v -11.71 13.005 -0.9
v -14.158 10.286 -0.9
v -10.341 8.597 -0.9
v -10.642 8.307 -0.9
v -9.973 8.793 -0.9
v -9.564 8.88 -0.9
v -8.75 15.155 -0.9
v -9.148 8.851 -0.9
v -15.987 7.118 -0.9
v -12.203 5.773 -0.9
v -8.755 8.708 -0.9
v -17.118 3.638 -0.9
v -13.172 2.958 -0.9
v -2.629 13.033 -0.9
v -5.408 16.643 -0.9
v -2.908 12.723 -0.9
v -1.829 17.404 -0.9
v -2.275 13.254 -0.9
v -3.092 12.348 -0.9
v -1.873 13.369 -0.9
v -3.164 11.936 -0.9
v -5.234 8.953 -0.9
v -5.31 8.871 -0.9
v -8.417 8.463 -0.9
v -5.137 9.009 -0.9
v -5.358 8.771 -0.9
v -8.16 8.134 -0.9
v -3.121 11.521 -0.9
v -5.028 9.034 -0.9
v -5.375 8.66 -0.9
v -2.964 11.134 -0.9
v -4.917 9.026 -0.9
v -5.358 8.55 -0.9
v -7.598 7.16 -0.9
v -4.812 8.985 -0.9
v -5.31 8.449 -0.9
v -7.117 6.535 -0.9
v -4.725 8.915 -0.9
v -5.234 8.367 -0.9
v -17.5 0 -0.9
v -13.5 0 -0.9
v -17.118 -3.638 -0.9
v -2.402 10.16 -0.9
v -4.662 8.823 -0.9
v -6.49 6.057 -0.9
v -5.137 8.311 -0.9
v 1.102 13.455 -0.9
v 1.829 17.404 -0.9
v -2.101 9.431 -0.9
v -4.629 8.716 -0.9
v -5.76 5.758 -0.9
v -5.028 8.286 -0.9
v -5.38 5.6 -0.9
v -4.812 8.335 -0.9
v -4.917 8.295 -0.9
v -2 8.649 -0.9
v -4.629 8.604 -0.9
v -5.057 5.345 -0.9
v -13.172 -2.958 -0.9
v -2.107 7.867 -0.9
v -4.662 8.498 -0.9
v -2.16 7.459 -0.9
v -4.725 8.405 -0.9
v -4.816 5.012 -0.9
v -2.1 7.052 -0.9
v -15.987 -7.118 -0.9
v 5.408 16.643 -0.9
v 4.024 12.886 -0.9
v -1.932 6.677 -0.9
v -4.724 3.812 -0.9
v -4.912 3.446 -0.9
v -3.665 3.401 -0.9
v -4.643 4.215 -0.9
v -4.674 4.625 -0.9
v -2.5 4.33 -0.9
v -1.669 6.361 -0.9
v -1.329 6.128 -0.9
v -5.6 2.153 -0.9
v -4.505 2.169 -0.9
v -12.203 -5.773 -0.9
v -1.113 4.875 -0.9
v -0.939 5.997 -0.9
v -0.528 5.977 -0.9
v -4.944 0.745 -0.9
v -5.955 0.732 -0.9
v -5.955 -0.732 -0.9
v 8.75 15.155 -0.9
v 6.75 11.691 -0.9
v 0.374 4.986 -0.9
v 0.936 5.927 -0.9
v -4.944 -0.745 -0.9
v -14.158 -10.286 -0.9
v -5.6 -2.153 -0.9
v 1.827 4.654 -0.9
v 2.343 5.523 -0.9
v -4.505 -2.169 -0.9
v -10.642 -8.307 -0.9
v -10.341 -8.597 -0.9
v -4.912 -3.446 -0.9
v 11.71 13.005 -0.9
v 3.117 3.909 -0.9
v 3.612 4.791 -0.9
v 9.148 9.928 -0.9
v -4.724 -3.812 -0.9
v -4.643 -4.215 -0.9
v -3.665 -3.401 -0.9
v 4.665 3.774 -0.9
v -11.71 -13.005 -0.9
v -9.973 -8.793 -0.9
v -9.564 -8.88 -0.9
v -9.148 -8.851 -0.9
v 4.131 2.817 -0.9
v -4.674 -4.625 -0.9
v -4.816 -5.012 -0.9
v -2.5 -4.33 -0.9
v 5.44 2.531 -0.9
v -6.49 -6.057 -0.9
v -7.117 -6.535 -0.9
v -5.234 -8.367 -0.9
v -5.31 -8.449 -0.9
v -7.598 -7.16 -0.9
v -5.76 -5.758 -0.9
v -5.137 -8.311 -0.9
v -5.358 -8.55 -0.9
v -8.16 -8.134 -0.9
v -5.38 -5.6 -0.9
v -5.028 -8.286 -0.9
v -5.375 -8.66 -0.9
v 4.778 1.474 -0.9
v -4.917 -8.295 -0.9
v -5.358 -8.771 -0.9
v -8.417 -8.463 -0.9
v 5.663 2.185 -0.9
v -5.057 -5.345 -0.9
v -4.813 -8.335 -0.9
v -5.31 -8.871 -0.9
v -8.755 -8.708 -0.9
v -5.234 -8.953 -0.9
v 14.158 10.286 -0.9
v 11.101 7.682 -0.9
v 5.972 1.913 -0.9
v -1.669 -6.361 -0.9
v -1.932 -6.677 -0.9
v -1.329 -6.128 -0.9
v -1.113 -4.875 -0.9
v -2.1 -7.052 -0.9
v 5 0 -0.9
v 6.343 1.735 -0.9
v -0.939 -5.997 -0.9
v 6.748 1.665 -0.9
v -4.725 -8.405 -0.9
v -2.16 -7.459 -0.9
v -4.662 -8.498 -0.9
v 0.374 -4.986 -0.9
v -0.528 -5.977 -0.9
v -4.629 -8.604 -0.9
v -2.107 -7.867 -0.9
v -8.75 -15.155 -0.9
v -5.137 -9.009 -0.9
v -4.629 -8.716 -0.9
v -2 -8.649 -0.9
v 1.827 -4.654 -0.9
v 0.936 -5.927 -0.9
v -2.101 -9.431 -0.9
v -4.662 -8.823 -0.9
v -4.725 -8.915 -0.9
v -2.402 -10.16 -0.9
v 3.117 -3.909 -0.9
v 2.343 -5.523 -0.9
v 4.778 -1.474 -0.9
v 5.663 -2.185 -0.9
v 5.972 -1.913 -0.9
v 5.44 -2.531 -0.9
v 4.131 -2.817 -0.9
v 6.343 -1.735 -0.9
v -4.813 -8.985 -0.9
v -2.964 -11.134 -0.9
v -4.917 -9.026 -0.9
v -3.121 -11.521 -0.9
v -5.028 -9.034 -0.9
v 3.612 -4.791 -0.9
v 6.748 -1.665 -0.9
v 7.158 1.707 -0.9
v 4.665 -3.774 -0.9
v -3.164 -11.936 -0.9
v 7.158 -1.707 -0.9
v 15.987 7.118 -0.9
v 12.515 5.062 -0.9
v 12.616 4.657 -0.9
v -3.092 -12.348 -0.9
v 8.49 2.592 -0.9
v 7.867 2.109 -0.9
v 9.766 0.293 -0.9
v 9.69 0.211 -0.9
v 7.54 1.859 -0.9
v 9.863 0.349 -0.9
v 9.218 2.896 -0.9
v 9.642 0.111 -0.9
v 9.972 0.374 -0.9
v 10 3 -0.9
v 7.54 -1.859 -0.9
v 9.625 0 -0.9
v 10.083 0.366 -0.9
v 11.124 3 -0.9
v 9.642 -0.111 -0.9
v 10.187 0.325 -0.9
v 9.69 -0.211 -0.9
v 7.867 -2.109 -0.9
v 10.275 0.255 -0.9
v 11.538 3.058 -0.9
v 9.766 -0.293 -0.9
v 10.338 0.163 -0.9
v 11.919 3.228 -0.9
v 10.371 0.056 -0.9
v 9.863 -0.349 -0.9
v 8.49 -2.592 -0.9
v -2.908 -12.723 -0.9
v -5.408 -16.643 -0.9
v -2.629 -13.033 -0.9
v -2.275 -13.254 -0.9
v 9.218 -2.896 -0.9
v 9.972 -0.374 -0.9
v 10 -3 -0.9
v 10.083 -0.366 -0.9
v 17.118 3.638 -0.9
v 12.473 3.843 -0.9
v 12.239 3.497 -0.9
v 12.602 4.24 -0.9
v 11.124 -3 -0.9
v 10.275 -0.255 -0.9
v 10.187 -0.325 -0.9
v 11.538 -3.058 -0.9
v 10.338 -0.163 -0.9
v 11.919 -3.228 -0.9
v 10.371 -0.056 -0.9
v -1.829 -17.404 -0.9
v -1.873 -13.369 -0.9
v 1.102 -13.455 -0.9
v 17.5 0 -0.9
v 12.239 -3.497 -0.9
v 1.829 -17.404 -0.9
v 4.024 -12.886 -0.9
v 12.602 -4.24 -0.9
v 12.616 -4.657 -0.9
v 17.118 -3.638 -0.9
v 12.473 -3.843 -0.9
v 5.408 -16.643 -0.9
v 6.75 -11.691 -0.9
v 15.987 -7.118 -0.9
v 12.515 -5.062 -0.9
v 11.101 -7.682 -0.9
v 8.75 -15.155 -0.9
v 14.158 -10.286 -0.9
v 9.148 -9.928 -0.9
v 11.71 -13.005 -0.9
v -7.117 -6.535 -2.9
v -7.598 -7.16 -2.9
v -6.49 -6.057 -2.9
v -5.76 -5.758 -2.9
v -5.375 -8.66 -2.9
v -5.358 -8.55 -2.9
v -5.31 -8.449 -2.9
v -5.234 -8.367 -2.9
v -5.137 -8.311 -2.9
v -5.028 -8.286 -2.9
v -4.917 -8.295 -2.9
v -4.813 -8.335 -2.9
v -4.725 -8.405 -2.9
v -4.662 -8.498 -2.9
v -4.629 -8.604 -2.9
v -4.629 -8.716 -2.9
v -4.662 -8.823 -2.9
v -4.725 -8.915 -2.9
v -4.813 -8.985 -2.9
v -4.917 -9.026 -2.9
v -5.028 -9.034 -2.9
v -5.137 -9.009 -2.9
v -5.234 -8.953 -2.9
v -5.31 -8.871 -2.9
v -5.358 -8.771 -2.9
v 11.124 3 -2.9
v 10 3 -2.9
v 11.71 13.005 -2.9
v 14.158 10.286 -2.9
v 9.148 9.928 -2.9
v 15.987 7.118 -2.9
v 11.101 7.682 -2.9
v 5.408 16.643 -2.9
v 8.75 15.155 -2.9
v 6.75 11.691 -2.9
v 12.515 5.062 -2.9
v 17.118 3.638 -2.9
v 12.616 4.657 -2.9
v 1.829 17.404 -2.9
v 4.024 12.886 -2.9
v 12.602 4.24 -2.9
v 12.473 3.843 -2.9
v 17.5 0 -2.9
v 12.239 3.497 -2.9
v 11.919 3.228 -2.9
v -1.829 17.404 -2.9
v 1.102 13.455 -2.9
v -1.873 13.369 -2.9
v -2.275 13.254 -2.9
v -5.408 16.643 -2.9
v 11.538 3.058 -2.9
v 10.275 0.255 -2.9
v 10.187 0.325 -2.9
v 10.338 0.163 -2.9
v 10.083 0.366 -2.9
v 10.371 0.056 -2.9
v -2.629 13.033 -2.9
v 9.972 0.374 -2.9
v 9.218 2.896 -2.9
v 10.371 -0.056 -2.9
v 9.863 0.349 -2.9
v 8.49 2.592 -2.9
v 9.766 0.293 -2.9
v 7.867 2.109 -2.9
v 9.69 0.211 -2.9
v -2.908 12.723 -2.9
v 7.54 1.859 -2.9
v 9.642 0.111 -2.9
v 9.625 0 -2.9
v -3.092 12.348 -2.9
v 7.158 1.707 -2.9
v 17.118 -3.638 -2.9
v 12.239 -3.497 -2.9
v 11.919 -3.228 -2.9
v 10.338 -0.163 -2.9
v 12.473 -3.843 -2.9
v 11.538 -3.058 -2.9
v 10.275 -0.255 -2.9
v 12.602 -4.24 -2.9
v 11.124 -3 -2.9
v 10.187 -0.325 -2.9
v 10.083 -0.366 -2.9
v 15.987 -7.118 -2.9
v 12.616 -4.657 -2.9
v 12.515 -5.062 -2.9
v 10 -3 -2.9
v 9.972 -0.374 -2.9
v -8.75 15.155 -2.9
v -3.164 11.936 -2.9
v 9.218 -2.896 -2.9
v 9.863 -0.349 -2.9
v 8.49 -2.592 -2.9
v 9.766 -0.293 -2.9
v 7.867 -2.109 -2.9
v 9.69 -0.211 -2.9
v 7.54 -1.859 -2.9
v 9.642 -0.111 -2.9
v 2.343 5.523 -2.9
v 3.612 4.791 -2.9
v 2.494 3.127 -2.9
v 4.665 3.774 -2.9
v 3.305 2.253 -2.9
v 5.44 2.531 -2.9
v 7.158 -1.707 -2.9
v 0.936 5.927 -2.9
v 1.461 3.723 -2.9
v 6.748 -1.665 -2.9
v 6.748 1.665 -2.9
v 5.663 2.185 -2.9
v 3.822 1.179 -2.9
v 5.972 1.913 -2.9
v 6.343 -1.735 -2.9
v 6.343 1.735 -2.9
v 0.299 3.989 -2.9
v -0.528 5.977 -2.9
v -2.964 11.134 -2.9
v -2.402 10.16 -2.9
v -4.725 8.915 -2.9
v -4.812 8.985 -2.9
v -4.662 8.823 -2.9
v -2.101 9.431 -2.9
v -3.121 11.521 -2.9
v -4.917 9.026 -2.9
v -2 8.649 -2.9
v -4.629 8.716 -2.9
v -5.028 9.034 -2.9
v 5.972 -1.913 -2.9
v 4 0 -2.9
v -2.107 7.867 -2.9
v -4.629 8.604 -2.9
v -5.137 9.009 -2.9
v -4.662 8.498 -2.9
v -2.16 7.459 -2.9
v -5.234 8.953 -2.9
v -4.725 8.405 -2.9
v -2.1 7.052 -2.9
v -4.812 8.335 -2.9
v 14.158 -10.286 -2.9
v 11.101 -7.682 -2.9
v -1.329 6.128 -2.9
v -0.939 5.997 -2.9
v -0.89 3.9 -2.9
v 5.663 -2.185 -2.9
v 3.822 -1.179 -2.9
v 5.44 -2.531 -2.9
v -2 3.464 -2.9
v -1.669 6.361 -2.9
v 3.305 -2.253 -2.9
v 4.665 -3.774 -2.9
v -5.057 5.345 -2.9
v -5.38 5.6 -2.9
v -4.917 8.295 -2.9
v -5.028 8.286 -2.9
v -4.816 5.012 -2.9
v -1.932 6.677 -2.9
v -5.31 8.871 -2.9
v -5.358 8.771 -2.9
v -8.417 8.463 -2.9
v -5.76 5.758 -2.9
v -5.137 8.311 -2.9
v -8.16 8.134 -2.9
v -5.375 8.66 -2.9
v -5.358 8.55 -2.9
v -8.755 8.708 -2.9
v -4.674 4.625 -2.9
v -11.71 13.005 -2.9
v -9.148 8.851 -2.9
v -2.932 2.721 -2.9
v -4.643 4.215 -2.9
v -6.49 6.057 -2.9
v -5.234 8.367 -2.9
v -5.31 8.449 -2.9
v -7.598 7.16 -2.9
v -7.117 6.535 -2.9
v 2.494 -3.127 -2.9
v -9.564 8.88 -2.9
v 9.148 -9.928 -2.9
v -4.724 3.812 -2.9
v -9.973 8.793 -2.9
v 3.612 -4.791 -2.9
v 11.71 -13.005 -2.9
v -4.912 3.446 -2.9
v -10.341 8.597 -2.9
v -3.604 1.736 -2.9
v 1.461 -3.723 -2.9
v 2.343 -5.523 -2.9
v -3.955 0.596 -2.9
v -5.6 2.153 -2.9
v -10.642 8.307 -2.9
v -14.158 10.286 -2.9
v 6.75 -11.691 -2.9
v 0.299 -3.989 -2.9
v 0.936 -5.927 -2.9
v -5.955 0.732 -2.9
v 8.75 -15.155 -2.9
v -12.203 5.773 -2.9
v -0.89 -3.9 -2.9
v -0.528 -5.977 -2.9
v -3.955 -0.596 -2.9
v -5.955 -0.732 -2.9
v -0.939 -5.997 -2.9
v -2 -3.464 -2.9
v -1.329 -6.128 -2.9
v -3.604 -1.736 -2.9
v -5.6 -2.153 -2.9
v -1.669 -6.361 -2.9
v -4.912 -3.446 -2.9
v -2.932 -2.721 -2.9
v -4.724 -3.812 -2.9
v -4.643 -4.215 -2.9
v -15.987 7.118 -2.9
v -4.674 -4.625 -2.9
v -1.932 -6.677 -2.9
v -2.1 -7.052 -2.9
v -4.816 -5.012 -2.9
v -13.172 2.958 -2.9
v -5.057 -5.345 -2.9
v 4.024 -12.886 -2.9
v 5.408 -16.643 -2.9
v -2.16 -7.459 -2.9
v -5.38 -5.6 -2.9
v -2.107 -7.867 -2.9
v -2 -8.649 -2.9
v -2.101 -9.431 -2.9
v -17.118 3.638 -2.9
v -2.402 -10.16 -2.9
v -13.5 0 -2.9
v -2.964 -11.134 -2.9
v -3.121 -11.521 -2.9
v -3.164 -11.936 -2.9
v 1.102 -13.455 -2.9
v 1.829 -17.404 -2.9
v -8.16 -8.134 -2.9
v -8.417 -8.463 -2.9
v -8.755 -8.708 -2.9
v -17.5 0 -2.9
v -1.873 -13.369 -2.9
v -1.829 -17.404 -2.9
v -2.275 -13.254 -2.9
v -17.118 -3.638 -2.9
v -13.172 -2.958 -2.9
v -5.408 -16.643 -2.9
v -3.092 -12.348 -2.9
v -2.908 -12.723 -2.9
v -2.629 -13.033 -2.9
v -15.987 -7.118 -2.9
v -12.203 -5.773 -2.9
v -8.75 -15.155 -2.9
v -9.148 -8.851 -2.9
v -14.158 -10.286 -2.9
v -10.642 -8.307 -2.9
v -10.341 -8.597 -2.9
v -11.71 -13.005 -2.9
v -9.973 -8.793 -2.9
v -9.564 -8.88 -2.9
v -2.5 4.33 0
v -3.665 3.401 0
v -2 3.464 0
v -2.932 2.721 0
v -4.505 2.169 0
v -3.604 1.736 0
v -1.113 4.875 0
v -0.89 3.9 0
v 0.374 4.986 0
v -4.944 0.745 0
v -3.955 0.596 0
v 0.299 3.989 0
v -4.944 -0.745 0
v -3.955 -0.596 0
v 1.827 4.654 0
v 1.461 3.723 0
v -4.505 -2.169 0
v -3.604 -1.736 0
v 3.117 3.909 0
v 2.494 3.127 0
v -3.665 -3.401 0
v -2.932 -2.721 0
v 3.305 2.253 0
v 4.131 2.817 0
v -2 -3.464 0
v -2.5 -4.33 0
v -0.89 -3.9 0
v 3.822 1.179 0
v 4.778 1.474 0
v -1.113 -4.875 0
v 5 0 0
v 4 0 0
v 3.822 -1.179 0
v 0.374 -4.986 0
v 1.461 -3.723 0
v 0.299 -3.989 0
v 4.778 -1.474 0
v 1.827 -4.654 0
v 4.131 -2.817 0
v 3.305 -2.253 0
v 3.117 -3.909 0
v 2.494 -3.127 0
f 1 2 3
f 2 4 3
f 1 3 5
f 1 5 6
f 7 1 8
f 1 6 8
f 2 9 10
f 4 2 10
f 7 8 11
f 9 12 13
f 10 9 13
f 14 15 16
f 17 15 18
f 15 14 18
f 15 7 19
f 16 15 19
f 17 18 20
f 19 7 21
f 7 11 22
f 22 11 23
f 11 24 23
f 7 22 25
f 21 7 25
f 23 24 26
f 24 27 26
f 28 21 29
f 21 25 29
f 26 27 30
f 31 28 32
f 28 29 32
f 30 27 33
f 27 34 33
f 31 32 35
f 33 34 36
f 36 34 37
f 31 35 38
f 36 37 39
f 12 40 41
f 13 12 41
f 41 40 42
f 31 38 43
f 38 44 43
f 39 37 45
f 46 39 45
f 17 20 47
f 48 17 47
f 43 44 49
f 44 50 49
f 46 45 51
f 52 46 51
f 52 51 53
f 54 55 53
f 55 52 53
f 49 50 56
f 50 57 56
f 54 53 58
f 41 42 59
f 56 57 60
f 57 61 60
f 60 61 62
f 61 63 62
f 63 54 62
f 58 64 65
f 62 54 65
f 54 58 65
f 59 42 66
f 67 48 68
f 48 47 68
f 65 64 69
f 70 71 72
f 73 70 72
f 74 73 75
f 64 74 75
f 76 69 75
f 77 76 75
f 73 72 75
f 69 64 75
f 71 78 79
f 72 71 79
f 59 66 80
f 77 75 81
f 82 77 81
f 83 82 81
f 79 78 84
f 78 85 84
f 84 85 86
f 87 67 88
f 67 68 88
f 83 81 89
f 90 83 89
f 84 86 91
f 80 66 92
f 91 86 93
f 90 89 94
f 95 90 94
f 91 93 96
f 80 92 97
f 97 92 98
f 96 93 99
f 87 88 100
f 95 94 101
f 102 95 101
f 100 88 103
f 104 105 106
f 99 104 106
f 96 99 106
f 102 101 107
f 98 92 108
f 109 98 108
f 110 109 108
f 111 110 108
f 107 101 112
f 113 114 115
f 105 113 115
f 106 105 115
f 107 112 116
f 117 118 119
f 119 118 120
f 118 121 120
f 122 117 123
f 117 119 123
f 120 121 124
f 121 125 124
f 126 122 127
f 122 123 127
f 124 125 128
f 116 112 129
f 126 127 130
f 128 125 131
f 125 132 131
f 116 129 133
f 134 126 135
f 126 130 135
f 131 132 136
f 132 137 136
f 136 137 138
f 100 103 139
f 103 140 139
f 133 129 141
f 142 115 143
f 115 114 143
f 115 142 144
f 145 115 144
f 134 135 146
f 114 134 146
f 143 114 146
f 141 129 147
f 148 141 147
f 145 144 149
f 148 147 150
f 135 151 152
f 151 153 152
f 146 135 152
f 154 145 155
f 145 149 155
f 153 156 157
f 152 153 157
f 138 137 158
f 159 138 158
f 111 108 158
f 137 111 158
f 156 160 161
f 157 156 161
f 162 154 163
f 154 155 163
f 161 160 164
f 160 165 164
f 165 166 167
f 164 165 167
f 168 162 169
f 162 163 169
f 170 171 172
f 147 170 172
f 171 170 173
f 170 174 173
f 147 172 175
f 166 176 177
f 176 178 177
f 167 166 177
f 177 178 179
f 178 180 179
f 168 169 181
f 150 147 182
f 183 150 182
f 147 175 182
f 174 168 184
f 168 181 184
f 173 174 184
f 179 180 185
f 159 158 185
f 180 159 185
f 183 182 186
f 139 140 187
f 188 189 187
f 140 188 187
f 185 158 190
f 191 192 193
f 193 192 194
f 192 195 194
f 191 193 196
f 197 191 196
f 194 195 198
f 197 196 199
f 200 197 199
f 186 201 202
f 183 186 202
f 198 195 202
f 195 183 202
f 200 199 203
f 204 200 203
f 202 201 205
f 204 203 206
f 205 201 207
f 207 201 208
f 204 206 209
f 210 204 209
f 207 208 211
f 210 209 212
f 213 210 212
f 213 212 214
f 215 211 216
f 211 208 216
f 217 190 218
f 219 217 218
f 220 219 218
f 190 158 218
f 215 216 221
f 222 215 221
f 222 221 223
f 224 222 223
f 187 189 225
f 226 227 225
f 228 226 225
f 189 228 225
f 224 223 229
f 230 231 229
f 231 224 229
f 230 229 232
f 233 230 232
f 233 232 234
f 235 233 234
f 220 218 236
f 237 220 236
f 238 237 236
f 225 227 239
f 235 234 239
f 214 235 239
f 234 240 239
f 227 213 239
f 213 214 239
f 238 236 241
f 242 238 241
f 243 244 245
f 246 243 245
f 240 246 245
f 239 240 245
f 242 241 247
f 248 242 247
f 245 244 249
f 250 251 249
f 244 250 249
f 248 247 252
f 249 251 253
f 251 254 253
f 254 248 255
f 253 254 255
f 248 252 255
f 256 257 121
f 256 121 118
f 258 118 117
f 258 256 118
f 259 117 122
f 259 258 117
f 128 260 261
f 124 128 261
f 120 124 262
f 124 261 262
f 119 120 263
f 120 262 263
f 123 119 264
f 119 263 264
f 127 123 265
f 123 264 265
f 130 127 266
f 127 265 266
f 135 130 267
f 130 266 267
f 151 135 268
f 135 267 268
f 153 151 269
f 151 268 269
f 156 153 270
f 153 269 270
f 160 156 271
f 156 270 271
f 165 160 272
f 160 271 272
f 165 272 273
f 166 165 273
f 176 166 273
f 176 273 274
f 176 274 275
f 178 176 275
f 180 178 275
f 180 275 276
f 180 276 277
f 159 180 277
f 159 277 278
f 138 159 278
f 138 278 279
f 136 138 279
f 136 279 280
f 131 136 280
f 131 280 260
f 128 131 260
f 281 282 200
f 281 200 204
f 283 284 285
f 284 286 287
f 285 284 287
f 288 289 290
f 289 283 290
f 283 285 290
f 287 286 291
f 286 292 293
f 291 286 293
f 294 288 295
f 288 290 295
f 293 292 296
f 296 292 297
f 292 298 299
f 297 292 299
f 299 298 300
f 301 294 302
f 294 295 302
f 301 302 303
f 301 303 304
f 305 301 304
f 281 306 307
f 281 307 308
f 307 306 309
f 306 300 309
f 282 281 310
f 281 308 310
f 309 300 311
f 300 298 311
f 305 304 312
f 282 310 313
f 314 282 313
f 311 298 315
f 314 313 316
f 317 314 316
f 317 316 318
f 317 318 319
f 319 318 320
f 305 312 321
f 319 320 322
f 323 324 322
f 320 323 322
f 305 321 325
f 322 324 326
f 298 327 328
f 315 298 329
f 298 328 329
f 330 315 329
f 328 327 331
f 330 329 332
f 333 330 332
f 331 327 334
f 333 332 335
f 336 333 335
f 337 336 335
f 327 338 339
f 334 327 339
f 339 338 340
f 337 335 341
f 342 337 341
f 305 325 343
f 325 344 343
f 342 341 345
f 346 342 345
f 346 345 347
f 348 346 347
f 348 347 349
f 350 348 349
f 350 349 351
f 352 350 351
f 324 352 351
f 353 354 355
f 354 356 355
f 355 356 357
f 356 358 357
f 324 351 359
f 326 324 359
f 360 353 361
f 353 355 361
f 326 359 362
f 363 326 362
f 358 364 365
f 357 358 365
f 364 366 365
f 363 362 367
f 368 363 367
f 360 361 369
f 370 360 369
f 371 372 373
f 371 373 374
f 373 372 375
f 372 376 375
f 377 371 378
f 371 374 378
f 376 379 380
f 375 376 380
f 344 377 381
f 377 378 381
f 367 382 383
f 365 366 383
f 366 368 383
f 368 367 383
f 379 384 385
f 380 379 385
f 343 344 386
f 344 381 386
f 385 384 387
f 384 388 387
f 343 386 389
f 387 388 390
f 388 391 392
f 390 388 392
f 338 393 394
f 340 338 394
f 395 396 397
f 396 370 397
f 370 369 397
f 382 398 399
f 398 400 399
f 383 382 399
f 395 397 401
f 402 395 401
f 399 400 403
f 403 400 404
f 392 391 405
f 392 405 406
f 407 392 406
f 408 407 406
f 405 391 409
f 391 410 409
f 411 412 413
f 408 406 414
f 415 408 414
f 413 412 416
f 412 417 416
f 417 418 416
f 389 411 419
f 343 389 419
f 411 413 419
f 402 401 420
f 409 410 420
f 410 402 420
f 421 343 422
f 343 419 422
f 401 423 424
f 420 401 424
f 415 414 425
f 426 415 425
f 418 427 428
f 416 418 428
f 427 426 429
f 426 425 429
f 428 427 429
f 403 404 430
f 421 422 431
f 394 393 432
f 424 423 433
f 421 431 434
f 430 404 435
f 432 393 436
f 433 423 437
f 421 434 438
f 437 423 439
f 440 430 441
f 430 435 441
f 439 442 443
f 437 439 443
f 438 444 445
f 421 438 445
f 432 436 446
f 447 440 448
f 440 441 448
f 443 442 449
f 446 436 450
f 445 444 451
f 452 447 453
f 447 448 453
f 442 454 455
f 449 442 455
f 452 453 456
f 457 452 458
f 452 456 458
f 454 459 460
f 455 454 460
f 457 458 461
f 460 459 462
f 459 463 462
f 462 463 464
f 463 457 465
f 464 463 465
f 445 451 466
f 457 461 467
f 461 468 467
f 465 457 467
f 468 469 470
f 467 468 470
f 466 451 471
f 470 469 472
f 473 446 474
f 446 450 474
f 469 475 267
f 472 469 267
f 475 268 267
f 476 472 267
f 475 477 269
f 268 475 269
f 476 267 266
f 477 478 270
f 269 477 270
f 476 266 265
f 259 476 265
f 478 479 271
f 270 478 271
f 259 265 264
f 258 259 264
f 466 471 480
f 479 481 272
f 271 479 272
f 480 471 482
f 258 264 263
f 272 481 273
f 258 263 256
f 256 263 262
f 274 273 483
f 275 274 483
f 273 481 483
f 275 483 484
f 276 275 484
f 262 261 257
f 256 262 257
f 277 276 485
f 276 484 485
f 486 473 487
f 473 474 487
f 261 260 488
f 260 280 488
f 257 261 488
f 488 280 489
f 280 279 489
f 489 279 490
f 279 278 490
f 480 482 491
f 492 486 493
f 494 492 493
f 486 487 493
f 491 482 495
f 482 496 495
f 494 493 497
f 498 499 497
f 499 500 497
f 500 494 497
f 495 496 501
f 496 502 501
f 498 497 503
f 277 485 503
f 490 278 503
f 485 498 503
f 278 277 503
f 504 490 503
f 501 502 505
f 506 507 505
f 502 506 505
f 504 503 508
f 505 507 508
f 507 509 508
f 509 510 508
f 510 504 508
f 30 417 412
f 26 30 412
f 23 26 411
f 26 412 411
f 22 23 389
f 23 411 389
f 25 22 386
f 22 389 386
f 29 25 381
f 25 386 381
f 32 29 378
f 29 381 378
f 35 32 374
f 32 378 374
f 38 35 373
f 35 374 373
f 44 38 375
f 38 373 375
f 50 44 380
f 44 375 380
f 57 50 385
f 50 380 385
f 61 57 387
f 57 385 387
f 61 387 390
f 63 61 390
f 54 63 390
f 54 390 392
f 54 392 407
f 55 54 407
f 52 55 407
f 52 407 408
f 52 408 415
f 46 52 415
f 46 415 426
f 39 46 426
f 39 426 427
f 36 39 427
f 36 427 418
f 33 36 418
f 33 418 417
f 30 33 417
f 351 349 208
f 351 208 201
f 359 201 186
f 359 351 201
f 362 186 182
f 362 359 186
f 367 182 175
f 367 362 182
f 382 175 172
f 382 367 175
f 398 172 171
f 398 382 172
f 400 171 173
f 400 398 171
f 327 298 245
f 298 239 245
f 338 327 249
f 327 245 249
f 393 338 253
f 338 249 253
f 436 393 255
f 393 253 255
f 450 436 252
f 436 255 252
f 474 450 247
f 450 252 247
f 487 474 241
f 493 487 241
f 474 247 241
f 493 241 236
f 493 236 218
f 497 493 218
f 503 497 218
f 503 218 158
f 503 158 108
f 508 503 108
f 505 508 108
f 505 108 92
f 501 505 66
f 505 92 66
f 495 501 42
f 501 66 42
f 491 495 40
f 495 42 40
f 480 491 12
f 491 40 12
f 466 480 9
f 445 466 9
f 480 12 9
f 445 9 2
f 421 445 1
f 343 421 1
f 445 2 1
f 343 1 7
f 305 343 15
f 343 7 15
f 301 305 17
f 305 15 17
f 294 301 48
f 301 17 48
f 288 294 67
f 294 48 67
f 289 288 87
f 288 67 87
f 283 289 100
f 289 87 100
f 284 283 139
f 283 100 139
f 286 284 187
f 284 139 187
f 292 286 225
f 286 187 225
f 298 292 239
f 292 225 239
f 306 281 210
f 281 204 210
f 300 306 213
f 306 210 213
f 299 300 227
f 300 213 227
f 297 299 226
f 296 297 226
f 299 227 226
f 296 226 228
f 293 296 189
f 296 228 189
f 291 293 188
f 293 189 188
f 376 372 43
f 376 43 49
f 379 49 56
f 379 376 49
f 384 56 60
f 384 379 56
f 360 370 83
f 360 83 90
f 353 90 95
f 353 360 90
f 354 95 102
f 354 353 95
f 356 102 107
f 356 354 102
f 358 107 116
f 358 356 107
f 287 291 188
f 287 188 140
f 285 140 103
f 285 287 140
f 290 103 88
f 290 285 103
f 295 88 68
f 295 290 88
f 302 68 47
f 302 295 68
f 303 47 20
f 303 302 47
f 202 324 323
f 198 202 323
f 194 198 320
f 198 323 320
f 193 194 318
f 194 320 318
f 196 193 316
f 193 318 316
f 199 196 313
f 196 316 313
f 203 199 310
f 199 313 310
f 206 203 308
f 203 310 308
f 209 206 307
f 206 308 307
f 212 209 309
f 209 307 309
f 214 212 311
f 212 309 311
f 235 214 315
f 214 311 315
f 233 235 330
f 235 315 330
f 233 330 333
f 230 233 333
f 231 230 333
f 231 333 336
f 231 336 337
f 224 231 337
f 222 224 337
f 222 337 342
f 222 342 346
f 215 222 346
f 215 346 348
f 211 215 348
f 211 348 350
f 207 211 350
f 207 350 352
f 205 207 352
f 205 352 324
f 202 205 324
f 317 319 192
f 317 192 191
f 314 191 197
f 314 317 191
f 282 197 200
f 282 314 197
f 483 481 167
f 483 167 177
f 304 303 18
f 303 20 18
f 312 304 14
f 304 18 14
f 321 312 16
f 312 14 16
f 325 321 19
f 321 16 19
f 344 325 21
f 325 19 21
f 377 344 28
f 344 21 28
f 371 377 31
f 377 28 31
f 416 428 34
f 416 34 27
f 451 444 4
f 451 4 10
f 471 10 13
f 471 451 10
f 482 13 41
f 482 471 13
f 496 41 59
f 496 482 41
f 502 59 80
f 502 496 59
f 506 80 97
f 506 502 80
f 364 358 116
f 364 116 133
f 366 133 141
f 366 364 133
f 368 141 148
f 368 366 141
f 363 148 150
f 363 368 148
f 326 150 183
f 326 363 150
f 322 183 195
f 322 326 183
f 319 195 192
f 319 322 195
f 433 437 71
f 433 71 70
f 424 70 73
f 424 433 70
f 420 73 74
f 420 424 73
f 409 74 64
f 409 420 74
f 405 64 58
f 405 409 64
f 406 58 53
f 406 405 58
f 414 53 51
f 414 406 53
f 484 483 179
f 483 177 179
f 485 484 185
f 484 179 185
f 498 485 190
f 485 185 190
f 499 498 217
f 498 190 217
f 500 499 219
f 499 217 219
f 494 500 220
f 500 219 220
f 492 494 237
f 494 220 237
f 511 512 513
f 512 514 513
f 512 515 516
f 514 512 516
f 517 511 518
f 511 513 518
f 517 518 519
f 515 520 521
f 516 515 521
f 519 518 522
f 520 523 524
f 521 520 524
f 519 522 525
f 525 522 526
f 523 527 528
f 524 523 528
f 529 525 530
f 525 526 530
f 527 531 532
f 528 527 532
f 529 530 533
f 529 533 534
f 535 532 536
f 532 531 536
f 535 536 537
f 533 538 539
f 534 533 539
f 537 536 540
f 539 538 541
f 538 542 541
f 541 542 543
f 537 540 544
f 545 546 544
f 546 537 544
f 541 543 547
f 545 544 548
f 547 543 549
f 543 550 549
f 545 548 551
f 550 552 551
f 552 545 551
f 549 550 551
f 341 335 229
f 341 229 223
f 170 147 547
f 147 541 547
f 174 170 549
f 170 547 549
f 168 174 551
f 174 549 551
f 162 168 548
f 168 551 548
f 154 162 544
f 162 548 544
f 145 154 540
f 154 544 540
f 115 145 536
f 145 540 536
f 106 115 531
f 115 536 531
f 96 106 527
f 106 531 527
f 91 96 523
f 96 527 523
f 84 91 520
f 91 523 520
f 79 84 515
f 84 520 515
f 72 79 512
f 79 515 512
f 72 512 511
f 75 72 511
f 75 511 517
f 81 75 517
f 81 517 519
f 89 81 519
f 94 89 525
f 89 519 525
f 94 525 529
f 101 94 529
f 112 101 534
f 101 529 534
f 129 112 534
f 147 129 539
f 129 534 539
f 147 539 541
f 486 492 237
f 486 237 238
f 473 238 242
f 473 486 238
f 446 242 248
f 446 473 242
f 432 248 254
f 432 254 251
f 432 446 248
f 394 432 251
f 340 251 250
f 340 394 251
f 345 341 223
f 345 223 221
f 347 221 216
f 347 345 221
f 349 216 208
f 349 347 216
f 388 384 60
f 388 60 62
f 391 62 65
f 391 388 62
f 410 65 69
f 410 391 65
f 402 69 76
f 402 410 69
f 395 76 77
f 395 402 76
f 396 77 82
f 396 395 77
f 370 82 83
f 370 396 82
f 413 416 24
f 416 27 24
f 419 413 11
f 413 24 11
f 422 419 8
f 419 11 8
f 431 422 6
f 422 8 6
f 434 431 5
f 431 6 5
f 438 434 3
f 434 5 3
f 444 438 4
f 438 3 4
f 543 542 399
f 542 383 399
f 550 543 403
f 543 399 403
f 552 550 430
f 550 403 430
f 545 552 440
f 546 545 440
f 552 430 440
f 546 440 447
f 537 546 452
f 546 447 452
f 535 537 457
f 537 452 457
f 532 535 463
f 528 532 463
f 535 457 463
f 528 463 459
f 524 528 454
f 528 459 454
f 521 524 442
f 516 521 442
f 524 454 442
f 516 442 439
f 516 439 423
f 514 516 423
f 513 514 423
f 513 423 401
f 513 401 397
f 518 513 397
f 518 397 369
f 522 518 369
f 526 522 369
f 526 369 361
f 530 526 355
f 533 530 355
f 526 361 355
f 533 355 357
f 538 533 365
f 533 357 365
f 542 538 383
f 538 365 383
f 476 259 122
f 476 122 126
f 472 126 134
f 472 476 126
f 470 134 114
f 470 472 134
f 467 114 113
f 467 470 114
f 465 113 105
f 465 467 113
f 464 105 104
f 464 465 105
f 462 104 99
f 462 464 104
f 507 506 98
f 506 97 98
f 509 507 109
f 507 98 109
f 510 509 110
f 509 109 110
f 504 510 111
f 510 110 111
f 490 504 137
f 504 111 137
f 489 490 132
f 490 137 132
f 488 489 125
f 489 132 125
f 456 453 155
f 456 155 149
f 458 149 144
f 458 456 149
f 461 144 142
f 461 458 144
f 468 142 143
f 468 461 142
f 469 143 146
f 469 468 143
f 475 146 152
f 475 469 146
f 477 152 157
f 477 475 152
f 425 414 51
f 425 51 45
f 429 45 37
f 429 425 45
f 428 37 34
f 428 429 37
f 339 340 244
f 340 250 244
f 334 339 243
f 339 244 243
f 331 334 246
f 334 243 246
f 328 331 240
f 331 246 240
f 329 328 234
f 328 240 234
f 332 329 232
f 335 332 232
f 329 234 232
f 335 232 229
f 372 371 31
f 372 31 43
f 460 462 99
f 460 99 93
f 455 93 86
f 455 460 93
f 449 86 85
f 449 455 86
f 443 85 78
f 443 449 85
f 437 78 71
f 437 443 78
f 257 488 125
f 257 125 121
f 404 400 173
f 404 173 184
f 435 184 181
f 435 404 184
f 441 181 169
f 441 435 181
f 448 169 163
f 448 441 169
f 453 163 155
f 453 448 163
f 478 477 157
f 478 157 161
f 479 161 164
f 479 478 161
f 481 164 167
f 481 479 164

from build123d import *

# Parameters (mm, degrees)
M1X0_25_1_D         = 0.75
CUT_EXTRUDE_START   = -2
CUT_EXTRUDE_1_DEPTH = 2
FILLET_1_R          = 1.5


# Read off the part's stored shape, not the designer's step: ｶｯﾄ - 押し出し1
with BuildPart() as part:
    # ｽｹｯﾁ1 → 回転1 (revolve)
    with BuildSketch(Plane(origin=(0, 0, 0), x_dir=(0, 0, -1), z_dir=(1, 0, 0)), mode=Mode.PRIVATE) as revolve_1_sk:
        Polygon((0, 4), (2.9, 4), (2.9, 17.5), (0.9, 17.5), (0.9, 5), (0, 5), align=None)
    revolve(revolve_1_sk.sketch.rotate(Axis((0, 0, 0), (0, 0, -1)), 90), axis=Axis((0, 0, 0), (0, 0, -1)))

    # M1x0.25 ねじ穴1 (through all)
    with Locations(Plane.XY.offset(-0.9)):
        with Locations((9.999999803, 0), (-5, 8.660254038), (-5.000000098, -8.660253981)):
            Hole(M1X0_25_1_D / 2)

    # ｶｯﾄ - 押し出し1 outline → ｶｯﾄ - 押し出し1 (cut)
    with BuildSketch(Plane.XY.offset(-0.9).offset(CUT_EXTRUDE_START)):
        with BuildLine():
            ThreePointArc((-4.91198547, -3.445634737), (-6, 0), (-4.91198547, 3.445634737))
            ThreePointArc((-4.91198547, 3.445634737), (-4.731685773, 4.823475601), (-5.759987903, 5.758113582))
            ThreePointArc((-5.759987903, 5.758113582), (-6.819518607, 6.275017773), (-7.598076211, 7.160254038))
            Line((-7.598076211, 7.160254038), (-9.179299502, 9.899013115))
            ThreePointArc((-9.179299502, 9.899013115), (-13.5, 8.7e-08), (-9.17929963, -9.899012996))
            Line((-9.17929963, -9.899012996), (-7.59807631, -7.160253868))
            ThreePointArc((-7.59807631, -7.160253868), (-6.819518691, -6.275017592), (-5.759987933, -5.758113538))
            ThreePointArc((-5.759987933, -5.758113538), (-4.731685776, -4.823475609), (-4.91198547, -3.445634737))
        make_face()
        with BuildLine():
            ThreePointArc((5.43999995, -2.531086831), (3, -5.196152423), (-0.52801448, -5.976721569))
            ThreePointArc((-0.52801448, -5.976721569), (-1.811409498, -6.509497859), (-2.106678705, -7.86735258))
            ThreePointArc((-2.106678705, -7.86735258), (-2.024565604, -9.043385134), (-2.401923887, -10.160253868))
            Line((-2.401923887, -10.160253868), (-3.983147246, -12.899013064))
            ThreePointArc((-3.983147246, -12.899013064), (6.749999924, -11.691342995), (13.162446581, -3))
            Line((13.162446581, -3), (9.999999803, -3))
            ThreePointArc((9.999999803, -3), (8.84408395, -2.768367486), (7.866666559, -2.109239026))
            ThreePointArc((7.866666559, -2.109239026), (6.543095269, -1.686022286), (5.43999995, -2.531086831))
        make_face()
        with BuildLine():
            ThreePointArc((-0.52801448, 5.976721569), (3, 5.196152423), (5.43999995, 2.531086831))
            ThreePointArc((5.43999995, 2.531086831), (6.543095269, 1.686022286), (7.866666559, 2.109239026))
            ThreePointArc((7.866666559, 2.109239026), (8.84408395, 2.768367486), (9.999999803, 3))
            Line((9.999999803, 3), (13.162446581, 3))
            ThreePointArc((13.162446581, 3), (6.75, 11.691342951), (-3.983147079, 12.899013115))
            Line((-3.983147079, 12.899013115), (-2.401923789, 10.160254038))
            ThreePointArc((-2.401923789, 10.160254038), (-2.024565497, 9.043385242), (-2.106678823, 7.867352678))
            ThreePointArc((-2.106678823, 7.867352678), (-1.811409518, 6.509497883), (-0.52801448, 5.976721569))
        make_face()
    extrude(amount=CUT_EXTRUDE_1_DEPTH, mode=Mode.SUBTRACT)

    # ﾌｨﾚｯﾄ1
    fillet_1_edges = [part.edges().sort_by_distance(p)[0] for p in [
        (-9.17929963, -9.899012996, -1.9),
        (-9.179299502, 9.899013115, -1.9),
        (-3.983147079, 12.899013115, -1.9),
        (13.162446581, 3, -1.9),
        (13.162446581, -3, -1.9),
        (-3.983147246, -12.899013064, -1.9),
    ]]
    fillet(fillet_1_edges, radius=FILLET_1_R)


solid = part.part
